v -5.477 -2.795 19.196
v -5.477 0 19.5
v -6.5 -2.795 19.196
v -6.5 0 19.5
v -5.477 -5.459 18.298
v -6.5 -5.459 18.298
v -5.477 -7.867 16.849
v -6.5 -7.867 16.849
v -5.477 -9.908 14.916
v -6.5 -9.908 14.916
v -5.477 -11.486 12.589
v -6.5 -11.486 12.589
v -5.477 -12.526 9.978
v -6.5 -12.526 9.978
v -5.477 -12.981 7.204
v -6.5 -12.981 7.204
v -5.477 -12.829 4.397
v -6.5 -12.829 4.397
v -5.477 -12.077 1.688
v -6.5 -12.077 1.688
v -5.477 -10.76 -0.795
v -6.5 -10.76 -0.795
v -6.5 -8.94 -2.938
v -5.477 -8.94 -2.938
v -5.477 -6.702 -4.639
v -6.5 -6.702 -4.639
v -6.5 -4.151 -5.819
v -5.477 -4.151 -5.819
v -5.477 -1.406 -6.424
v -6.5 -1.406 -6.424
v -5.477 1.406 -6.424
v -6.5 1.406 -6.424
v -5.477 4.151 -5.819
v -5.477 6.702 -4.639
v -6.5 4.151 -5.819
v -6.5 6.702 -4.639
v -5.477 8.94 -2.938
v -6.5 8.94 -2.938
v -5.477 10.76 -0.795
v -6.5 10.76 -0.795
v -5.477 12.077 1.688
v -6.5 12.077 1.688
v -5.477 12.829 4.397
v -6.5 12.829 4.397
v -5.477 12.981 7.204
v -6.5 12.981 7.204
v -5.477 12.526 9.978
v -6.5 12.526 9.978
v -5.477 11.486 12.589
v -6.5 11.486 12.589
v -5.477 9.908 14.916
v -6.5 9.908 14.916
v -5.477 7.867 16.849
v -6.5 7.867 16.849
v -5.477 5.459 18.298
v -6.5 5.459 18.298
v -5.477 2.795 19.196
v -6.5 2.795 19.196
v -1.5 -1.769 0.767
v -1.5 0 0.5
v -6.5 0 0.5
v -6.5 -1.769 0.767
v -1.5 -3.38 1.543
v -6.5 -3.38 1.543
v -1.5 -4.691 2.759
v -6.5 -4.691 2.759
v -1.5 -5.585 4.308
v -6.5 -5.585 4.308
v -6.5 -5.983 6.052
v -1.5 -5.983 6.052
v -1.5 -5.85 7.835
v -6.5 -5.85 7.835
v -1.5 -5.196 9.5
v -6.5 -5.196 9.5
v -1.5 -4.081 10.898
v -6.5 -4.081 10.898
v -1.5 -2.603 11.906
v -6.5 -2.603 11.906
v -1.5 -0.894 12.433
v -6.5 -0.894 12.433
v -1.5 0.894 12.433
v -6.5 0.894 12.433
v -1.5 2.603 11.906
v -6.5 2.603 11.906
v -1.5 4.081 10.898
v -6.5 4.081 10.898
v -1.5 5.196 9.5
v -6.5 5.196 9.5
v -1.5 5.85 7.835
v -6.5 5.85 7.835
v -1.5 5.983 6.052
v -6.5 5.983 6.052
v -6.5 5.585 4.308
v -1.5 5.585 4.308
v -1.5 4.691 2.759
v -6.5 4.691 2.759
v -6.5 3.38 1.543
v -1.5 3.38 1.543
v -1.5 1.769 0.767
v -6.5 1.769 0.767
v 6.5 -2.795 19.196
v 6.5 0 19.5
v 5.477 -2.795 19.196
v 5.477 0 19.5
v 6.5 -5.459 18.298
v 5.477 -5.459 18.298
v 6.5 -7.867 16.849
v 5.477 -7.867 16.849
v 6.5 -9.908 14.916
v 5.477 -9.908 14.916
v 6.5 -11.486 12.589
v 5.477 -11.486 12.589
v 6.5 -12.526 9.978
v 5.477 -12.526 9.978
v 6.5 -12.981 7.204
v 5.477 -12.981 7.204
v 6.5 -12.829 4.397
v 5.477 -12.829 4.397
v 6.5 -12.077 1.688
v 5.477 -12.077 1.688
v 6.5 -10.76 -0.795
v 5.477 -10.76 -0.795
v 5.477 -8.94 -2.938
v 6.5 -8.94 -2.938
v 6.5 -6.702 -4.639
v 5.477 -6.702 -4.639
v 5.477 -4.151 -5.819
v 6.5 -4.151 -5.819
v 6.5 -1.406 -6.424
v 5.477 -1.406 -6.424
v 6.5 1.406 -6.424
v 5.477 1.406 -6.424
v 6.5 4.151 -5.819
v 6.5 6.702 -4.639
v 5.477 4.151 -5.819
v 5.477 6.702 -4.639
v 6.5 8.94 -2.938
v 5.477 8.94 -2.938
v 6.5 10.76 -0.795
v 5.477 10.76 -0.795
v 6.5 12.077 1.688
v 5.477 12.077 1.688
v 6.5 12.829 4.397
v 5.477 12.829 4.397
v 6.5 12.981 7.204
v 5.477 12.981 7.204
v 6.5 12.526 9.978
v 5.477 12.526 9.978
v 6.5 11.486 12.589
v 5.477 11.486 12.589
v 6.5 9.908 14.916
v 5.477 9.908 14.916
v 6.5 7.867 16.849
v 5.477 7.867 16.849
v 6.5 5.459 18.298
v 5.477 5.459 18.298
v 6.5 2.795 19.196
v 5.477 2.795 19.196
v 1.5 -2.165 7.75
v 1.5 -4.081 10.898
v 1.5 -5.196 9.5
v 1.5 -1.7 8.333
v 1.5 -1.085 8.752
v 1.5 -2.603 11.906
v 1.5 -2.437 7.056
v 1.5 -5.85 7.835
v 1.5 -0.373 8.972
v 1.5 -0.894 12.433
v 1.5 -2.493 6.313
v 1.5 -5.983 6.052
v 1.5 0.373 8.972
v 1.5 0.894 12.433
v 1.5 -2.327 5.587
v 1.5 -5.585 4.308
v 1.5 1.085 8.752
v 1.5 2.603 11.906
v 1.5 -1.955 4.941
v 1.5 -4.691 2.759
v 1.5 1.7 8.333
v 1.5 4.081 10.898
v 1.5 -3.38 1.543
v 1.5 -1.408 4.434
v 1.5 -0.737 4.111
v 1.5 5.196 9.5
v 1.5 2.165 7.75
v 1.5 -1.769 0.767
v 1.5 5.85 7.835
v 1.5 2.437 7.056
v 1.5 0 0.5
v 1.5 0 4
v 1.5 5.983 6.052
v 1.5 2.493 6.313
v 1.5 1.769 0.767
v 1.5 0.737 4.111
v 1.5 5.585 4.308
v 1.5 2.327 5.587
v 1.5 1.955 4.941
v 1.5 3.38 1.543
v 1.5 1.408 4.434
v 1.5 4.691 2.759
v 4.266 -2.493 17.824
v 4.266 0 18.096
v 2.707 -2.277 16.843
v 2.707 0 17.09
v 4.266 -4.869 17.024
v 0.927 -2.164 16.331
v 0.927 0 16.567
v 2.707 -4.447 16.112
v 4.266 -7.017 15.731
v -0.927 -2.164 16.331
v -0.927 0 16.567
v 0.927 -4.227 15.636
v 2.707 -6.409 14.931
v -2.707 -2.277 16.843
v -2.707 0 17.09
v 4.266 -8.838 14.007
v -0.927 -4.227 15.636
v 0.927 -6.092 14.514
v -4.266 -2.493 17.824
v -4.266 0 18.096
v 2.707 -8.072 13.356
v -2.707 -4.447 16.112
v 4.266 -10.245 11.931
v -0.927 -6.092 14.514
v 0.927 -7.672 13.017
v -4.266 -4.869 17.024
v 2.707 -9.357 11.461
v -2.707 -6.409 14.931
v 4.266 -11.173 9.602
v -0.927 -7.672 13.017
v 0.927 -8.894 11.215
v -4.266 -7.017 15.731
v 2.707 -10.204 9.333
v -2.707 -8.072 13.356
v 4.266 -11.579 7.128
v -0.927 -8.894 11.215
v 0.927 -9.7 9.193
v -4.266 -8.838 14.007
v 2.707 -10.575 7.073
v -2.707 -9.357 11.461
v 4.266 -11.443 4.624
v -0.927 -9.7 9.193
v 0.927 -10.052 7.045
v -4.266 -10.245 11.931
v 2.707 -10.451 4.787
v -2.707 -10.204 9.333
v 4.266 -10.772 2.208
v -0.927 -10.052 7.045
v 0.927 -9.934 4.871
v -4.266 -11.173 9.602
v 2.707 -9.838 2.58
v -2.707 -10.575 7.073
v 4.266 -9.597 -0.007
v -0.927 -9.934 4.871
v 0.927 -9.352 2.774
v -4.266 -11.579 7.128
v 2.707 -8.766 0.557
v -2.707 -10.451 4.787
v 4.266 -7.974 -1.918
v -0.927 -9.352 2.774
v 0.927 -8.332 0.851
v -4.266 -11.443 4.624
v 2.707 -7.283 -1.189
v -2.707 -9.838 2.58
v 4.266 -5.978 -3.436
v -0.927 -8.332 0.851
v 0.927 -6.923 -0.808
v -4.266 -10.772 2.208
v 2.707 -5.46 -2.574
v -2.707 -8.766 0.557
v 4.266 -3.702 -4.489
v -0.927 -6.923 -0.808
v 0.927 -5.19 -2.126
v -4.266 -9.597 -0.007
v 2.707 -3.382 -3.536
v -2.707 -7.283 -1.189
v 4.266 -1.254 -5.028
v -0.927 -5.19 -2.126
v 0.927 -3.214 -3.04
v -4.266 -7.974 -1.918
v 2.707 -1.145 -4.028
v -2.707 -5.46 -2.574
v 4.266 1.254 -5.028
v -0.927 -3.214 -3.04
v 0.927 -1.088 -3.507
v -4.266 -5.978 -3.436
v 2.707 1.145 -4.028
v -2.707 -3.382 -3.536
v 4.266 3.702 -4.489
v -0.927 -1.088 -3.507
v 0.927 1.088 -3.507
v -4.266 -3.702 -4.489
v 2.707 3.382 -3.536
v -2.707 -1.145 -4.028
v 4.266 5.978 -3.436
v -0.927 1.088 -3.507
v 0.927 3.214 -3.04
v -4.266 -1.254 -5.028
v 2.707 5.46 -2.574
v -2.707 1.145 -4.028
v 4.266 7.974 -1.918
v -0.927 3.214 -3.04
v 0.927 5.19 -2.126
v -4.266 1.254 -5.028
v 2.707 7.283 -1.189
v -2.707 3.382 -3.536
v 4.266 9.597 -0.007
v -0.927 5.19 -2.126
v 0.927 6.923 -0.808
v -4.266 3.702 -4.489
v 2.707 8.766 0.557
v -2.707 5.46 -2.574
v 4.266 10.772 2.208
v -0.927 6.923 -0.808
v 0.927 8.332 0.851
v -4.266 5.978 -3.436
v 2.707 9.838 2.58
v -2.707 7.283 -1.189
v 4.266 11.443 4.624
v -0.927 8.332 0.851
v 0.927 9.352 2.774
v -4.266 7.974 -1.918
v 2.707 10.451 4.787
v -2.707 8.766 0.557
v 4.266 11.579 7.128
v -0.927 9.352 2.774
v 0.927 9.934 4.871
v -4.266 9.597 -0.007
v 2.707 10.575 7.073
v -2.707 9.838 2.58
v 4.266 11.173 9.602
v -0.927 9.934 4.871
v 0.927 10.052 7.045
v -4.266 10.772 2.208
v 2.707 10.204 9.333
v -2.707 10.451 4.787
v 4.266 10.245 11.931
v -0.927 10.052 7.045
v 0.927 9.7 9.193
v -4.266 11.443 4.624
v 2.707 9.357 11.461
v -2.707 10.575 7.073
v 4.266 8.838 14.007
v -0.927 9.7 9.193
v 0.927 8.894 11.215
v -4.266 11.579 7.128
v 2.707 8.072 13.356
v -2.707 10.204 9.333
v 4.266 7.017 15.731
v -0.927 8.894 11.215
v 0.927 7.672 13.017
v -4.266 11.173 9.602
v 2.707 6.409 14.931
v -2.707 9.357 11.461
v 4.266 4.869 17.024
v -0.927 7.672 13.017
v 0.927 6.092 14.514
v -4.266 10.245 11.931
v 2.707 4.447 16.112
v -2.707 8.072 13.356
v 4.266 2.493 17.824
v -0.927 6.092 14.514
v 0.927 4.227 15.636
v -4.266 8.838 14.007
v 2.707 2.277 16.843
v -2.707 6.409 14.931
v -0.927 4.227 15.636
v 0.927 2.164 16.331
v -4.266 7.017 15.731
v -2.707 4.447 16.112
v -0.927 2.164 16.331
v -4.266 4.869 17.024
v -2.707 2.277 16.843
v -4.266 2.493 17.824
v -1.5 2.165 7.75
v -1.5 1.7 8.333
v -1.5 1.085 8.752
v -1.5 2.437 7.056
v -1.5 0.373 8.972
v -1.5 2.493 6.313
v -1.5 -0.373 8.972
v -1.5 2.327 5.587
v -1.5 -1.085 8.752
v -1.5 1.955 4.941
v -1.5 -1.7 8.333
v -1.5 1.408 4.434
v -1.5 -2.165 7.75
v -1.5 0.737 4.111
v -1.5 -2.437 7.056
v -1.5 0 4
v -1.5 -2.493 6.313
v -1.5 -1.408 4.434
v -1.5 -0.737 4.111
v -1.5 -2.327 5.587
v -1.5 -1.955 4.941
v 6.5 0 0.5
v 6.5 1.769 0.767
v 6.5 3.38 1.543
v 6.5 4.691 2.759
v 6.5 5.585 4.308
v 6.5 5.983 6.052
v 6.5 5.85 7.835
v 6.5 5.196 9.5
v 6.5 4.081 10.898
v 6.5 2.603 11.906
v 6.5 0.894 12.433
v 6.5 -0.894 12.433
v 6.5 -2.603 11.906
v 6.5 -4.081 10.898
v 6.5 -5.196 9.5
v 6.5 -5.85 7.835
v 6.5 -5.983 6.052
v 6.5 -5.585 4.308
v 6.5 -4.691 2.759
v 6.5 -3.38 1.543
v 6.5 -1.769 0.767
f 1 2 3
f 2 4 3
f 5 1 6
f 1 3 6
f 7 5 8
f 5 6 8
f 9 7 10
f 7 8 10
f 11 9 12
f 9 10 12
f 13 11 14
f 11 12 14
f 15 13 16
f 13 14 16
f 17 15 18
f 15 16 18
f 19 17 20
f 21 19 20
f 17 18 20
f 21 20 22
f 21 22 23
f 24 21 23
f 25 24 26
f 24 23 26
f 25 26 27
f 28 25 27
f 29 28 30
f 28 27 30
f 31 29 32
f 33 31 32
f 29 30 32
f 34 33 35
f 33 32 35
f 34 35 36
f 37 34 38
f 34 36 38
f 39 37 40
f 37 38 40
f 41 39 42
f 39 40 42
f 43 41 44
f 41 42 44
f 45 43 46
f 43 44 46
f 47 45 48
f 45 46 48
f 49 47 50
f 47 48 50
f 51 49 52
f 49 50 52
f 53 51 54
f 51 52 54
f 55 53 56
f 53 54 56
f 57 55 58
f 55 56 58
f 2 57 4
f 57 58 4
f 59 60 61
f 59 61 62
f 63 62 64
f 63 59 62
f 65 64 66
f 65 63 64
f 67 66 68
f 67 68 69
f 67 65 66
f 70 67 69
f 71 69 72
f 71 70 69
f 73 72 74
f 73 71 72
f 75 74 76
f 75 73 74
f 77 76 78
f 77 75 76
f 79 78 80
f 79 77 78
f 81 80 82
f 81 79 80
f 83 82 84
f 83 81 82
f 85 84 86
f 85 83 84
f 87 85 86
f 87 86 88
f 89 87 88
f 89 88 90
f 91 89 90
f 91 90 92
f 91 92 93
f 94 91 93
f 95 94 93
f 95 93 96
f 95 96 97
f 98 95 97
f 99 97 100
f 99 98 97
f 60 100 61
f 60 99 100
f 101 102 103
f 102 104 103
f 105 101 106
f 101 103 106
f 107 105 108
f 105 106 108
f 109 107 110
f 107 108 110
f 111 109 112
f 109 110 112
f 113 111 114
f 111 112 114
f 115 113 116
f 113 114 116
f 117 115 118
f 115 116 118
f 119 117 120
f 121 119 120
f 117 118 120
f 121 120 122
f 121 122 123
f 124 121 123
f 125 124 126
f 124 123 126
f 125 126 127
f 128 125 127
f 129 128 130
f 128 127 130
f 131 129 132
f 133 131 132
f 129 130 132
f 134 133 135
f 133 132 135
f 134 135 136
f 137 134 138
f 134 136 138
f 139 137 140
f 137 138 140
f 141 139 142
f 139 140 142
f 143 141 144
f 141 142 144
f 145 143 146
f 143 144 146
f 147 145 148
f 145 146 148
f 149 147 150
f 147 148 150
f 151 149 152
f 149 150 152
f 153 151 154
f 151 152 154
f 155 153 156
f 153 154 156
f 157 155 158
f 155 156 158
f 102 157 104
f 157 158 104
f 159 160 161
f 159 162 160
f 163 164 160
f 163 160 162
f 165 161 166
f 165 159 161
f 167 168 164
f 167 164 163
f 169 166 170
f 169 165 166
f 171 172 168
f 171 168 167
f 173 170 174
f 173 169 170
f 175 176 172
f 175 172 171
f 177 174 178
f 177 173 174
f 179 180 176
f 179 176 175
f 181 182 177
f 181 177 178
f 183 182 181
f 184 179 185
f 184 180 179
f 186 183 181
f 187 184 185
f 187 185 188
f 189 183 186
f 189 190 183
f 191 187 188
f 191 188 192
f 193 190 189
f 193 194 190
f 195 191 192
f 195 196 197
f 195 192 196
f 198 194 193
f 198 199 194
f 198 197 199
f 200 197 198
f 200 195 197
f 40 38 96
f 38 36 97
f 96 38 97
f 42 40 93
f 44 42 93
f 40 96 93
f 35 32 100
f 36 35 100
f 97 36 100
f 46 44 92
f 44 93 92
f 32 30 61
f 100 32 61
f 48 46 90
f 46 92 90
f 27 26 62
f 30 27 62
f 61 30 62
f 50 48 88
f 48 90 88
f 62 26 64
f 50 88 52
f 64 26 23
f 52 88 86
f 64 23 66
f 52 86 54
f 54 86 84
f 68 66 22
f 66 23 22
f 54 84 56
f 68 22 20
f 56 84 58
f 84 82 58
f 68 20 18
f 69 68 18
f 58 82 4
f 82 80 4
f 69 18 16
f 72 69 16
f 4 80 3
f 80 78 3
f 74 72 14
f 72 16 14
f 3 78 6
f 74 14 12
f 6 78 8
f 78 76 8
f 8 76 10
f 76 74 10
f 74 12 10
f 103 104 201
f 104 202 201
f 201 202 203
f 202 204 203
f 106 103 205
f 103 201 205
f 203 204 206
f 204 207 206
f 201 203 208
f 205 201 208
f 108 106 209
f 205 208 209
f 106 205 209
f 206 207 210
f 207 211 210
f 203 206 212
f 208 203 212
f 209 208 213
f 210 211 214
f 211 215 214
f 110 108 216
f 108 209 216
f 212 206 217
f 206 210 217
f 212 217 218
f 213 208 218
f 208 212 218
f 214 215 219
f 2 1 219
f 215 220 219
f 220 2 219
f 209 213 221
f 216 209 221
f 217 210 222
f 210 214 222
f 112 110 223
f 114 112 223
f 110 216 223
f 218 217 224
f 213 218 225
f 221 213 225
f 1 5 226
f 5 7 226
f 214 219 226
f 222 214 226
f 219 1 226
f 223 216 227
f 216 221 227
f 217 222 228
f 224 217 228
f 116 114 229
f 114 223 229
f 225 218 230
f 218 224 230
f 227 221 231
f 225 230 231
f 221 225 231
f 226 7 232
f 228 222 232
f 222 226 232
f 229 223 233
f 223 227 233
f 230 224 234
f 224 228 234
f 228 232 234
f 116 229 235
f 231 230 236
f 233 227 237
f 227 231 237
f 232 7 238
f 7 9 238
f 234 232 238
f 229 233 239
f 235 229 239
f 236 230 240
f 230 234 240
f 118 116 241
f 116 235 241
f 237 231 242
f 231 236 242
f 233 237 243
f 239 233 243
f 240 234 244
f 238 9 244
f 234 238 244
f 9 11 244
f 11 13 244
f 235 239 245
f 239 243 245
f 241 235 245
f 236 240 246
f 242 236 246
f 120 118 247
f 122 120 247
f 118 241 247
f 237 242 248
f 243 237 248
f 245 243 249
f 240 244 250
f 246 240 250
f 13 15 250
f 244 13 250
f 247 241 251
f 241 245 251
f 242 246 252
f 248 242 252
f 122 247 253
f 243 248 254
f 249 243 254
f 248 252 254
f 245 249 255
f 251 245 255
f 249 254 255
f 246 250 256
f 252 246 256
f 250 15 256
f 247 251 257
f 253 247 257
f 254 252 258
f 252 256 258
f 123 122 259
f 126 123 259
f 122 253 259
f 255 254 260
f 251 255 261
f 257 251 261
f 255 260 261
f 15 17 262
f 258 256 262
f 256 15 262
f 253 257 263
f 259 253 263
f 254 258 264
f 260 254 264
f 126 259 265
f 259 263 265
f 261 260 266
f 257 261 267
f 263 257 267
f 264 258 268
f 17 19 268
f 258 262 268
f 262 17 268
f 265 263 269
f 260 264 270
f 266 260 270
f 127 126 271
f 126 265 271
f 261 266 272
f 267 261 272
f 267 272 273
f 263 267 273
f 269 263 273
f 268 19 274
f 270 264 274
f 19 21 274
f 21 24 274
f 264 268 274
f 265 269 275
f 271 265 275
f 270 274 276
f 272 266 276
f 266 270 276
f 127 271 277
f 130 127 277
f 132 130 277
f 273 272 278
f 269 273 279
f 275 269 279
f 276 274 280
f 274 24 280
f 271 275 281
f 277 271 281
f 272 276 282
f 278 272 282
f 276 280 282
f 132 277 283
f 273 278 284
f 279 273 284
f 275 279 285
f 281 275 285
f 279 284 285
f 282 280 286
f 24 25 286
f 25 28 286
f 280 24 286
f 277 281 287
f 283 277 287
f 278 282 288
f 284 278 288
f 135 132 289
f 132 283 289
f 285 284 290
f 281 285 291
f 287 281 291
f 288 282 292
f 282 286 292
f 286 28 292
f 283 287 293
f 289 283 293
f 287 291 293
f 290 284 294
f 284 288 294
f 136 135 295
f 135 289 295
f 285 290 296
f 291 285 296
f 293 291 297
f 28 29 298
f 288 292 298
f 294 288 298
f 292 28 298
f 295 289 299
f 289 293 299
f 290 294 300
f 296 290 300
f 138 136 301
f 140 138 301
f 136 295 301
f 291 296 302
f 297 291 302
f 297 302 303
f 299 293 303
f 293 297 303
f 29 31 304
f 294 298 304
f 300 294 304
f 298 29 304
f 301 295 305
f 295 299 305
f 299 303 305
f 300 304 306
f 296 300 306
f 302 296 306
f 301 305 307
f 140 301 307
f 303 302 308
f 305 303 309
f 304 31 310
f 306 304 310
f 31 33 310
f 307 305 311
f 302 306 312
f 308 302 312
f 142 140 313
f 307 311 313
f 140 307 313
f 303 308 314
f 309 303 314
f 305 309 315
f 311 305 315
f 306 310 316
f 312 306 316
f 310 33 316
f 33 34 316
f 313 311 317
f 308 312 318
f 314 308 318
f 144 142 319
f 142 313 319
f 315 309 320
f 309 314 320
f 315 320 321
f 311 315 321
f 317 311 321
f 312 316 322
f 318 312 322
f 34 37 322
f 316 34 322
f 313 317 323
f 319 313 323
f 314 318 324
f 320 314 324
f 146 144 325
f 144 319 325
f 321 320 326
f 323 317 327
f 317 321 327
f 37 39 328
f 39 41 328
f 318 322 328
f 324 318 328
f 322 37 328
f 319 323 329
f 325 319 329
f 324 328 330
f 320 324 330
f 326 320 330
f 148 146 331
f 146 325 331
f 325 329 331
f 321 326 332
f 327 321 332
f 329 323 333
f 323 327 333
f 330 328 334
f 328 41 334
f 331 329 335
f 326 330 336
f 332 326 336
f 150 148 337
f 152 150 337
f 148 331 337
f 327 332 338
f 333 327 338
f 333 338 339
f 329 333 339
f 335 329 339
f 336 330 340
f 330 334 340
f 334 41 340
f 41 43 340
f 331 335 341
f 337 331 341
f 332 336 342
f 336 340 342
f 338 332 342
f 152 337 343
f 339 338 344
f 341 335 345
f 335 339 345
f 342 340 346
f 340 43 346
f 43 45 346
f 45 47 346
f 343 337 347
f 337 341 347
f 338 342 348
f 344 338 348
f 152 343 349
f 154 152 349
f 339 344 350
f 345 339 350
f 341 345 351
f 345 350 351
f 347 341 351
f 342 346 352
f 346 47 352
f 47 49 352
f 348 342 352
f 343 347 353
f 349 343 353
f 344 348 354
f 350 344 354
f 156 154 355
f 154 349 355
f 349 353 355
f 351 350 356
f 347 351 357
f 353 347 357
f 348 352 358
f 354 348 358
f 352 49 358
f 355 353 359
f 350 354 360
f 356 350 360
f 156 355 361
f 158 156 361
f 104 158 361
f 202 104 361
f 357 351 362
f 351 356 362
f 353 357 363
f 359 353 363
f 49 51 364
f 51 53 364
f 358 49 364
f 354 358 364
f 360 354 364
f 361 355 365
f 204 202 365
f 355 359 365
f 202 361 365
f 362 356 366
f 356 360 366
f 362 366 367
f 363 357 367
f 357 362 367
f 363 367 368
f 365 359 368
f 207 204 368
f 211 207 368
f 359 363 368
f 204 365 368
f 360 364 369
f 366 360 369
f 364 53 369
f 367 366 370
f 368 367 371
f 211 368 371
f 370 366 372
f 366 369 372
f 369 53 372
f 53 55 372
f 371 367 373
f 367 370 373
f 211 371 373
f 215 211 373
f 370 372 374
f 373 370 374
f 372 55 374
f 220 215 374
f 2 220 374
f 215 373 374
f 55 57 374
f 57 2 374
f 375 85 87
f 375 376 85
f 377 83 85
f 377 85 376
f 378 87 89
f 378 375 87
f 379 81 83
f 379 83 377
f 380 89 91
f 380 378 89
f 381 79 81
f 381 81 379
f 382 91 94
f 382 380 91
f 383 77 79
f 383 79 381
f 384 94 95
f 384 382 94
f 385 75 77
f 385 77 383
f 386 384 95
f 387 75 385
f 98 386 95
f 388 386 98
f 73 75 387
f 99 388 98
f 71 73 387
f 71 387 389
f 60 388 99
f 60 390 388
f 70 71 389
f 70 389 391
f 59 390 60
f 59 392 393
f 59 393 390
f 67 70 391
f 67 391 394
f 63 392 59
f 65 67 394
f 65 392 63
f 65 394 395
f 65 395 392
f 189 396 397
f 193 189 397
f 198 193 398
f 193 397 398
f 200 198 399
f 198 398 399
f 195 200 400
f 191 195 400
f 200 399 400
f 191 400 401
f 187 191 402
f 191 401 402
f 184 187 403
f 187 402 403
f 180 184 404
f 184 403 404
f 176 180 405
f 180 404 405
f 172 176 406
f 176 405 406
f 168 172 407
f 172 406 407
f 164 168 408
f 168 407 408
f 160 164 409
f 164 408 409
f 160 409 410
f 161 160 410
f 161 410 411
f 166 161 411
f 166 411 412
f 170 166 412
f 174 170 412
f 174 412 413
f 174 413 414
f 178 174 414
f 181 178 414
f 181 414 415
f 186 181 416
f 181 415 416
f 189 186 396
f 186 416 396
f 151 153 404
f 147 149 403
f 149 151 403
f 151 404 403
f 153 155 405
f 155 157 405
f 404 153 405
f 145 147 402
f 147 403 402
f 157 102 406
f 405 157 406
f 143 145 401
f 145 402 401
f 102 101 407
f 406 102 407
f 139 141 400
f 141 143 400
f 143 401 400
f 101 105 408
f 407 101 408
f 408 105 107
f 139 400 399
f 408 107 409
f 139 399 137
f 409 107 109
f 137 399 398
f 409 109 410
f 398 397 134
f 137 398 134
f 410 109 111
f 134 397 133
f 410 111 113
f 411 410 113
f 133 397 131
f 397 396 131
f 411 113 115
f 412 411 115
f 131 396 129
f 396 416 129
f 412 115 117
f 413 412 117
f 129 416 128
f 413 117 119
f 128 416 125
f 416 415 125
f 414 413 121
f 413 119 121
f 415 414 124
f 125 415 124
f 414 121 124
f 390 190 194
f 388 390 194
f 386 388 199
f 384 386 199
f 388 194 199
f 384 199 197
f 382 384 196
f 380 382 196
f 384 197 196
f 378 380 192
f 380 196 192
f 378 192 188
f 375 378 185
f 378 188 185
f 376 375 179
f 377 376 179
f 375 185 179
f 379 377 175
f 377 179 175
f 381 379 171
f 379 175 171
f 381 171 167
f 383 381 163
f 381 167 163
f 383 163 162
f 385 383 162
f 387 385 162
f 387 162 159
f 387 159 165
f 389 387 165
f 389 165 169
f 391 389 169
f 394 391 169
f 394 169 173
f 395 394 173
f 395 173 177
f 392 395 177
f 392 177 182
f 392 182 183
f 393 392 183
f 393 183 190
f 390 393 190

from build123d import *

# Parameters (mm, degrees)
SKETCH_2_R          = 2.5
CUT_EXTRUDE_1_DEPTH = 55
SKETCH_3_R          = 6
CUT_EXTRUDE_2_DEPTH = 5
CUT_EXTRUDE_START   = -5
SKETCH_4_R          = 6
CUT_EXTRUDE_3_DEPTH = 5


with BuildPart() as part:
    # 草图1 → 旋转1 (revolve)
    with BuildSketch(Plane(origin=(0, 0, 0), x_dir=(1, 0, 0), z_dir=(0, 1, 0)), mode=Mode.PRIVATE) as revolve_1_sk:
        with BuildLine():
            Line((-6.5, 6.5), (-6.5, -6.5))
            Line((-6.5, -6.5), (6.5, -6.5))
            Line((6.5, -6.5), (6.5, 6.5))
            Line((6.5, 6.5), (5.477225575, 6.5))
            ThreePointArc((5.477225575, 6.5), (0, 3.5), (-5.477225575, 6.5))
            Line((-5.477225575, 6.5), (-6.5, 6.5))
        make_face()
    revolve(revolve_1_sk.sketch.rotate(Axis((-6.5, 0, 6.5), (1, 0, 0)), 180), axis=Axis((-6.5, 0, 6.5), (1, 0, 0)))

    # 草图2 → 切除-拉伸1 (cut)
    with BuildSketch(Plane(origin=(6.5, 0, 0), x_dir=(0, 0, -1), z_dir=(1, 0, 0))):
        with Locations((-6.5, 0)):
            Circle(SKETCH_2_R)
    extrude(amount=-CUT_EXTRUDE_1_DEPTH, mode=Mode.SUBTRACT)

    # 草图3 → 切除-拉伸2 (cut)
    with BuildSketch(Plane(origin=(6.5, 0, 0), x_dir=(0, 0, -1), z_dir=(1, 0, 0))):
        with Locations((-6.5, 0)):
            Circle(SKETCH_3_R)
    extrude(amount=-CUT_EXTRUDE_2_DEPTH, mode=Mode.SUBTRACT)

    # 草图4 → 切除-拉伸3 (cut)
    with BuildSketch(Plane.ZY.offset(6.5).offset(CUT_EXTRUDE_START)):
        with Locations(Location((6.5, 0, 0), (0, 0, 180))):
            Circle(SKETCH_4_R)
    extrude(amount=CUT_EXTRUDE_3_DEPTH, mode=Mode.SUBTRACT)


solid = part.part
